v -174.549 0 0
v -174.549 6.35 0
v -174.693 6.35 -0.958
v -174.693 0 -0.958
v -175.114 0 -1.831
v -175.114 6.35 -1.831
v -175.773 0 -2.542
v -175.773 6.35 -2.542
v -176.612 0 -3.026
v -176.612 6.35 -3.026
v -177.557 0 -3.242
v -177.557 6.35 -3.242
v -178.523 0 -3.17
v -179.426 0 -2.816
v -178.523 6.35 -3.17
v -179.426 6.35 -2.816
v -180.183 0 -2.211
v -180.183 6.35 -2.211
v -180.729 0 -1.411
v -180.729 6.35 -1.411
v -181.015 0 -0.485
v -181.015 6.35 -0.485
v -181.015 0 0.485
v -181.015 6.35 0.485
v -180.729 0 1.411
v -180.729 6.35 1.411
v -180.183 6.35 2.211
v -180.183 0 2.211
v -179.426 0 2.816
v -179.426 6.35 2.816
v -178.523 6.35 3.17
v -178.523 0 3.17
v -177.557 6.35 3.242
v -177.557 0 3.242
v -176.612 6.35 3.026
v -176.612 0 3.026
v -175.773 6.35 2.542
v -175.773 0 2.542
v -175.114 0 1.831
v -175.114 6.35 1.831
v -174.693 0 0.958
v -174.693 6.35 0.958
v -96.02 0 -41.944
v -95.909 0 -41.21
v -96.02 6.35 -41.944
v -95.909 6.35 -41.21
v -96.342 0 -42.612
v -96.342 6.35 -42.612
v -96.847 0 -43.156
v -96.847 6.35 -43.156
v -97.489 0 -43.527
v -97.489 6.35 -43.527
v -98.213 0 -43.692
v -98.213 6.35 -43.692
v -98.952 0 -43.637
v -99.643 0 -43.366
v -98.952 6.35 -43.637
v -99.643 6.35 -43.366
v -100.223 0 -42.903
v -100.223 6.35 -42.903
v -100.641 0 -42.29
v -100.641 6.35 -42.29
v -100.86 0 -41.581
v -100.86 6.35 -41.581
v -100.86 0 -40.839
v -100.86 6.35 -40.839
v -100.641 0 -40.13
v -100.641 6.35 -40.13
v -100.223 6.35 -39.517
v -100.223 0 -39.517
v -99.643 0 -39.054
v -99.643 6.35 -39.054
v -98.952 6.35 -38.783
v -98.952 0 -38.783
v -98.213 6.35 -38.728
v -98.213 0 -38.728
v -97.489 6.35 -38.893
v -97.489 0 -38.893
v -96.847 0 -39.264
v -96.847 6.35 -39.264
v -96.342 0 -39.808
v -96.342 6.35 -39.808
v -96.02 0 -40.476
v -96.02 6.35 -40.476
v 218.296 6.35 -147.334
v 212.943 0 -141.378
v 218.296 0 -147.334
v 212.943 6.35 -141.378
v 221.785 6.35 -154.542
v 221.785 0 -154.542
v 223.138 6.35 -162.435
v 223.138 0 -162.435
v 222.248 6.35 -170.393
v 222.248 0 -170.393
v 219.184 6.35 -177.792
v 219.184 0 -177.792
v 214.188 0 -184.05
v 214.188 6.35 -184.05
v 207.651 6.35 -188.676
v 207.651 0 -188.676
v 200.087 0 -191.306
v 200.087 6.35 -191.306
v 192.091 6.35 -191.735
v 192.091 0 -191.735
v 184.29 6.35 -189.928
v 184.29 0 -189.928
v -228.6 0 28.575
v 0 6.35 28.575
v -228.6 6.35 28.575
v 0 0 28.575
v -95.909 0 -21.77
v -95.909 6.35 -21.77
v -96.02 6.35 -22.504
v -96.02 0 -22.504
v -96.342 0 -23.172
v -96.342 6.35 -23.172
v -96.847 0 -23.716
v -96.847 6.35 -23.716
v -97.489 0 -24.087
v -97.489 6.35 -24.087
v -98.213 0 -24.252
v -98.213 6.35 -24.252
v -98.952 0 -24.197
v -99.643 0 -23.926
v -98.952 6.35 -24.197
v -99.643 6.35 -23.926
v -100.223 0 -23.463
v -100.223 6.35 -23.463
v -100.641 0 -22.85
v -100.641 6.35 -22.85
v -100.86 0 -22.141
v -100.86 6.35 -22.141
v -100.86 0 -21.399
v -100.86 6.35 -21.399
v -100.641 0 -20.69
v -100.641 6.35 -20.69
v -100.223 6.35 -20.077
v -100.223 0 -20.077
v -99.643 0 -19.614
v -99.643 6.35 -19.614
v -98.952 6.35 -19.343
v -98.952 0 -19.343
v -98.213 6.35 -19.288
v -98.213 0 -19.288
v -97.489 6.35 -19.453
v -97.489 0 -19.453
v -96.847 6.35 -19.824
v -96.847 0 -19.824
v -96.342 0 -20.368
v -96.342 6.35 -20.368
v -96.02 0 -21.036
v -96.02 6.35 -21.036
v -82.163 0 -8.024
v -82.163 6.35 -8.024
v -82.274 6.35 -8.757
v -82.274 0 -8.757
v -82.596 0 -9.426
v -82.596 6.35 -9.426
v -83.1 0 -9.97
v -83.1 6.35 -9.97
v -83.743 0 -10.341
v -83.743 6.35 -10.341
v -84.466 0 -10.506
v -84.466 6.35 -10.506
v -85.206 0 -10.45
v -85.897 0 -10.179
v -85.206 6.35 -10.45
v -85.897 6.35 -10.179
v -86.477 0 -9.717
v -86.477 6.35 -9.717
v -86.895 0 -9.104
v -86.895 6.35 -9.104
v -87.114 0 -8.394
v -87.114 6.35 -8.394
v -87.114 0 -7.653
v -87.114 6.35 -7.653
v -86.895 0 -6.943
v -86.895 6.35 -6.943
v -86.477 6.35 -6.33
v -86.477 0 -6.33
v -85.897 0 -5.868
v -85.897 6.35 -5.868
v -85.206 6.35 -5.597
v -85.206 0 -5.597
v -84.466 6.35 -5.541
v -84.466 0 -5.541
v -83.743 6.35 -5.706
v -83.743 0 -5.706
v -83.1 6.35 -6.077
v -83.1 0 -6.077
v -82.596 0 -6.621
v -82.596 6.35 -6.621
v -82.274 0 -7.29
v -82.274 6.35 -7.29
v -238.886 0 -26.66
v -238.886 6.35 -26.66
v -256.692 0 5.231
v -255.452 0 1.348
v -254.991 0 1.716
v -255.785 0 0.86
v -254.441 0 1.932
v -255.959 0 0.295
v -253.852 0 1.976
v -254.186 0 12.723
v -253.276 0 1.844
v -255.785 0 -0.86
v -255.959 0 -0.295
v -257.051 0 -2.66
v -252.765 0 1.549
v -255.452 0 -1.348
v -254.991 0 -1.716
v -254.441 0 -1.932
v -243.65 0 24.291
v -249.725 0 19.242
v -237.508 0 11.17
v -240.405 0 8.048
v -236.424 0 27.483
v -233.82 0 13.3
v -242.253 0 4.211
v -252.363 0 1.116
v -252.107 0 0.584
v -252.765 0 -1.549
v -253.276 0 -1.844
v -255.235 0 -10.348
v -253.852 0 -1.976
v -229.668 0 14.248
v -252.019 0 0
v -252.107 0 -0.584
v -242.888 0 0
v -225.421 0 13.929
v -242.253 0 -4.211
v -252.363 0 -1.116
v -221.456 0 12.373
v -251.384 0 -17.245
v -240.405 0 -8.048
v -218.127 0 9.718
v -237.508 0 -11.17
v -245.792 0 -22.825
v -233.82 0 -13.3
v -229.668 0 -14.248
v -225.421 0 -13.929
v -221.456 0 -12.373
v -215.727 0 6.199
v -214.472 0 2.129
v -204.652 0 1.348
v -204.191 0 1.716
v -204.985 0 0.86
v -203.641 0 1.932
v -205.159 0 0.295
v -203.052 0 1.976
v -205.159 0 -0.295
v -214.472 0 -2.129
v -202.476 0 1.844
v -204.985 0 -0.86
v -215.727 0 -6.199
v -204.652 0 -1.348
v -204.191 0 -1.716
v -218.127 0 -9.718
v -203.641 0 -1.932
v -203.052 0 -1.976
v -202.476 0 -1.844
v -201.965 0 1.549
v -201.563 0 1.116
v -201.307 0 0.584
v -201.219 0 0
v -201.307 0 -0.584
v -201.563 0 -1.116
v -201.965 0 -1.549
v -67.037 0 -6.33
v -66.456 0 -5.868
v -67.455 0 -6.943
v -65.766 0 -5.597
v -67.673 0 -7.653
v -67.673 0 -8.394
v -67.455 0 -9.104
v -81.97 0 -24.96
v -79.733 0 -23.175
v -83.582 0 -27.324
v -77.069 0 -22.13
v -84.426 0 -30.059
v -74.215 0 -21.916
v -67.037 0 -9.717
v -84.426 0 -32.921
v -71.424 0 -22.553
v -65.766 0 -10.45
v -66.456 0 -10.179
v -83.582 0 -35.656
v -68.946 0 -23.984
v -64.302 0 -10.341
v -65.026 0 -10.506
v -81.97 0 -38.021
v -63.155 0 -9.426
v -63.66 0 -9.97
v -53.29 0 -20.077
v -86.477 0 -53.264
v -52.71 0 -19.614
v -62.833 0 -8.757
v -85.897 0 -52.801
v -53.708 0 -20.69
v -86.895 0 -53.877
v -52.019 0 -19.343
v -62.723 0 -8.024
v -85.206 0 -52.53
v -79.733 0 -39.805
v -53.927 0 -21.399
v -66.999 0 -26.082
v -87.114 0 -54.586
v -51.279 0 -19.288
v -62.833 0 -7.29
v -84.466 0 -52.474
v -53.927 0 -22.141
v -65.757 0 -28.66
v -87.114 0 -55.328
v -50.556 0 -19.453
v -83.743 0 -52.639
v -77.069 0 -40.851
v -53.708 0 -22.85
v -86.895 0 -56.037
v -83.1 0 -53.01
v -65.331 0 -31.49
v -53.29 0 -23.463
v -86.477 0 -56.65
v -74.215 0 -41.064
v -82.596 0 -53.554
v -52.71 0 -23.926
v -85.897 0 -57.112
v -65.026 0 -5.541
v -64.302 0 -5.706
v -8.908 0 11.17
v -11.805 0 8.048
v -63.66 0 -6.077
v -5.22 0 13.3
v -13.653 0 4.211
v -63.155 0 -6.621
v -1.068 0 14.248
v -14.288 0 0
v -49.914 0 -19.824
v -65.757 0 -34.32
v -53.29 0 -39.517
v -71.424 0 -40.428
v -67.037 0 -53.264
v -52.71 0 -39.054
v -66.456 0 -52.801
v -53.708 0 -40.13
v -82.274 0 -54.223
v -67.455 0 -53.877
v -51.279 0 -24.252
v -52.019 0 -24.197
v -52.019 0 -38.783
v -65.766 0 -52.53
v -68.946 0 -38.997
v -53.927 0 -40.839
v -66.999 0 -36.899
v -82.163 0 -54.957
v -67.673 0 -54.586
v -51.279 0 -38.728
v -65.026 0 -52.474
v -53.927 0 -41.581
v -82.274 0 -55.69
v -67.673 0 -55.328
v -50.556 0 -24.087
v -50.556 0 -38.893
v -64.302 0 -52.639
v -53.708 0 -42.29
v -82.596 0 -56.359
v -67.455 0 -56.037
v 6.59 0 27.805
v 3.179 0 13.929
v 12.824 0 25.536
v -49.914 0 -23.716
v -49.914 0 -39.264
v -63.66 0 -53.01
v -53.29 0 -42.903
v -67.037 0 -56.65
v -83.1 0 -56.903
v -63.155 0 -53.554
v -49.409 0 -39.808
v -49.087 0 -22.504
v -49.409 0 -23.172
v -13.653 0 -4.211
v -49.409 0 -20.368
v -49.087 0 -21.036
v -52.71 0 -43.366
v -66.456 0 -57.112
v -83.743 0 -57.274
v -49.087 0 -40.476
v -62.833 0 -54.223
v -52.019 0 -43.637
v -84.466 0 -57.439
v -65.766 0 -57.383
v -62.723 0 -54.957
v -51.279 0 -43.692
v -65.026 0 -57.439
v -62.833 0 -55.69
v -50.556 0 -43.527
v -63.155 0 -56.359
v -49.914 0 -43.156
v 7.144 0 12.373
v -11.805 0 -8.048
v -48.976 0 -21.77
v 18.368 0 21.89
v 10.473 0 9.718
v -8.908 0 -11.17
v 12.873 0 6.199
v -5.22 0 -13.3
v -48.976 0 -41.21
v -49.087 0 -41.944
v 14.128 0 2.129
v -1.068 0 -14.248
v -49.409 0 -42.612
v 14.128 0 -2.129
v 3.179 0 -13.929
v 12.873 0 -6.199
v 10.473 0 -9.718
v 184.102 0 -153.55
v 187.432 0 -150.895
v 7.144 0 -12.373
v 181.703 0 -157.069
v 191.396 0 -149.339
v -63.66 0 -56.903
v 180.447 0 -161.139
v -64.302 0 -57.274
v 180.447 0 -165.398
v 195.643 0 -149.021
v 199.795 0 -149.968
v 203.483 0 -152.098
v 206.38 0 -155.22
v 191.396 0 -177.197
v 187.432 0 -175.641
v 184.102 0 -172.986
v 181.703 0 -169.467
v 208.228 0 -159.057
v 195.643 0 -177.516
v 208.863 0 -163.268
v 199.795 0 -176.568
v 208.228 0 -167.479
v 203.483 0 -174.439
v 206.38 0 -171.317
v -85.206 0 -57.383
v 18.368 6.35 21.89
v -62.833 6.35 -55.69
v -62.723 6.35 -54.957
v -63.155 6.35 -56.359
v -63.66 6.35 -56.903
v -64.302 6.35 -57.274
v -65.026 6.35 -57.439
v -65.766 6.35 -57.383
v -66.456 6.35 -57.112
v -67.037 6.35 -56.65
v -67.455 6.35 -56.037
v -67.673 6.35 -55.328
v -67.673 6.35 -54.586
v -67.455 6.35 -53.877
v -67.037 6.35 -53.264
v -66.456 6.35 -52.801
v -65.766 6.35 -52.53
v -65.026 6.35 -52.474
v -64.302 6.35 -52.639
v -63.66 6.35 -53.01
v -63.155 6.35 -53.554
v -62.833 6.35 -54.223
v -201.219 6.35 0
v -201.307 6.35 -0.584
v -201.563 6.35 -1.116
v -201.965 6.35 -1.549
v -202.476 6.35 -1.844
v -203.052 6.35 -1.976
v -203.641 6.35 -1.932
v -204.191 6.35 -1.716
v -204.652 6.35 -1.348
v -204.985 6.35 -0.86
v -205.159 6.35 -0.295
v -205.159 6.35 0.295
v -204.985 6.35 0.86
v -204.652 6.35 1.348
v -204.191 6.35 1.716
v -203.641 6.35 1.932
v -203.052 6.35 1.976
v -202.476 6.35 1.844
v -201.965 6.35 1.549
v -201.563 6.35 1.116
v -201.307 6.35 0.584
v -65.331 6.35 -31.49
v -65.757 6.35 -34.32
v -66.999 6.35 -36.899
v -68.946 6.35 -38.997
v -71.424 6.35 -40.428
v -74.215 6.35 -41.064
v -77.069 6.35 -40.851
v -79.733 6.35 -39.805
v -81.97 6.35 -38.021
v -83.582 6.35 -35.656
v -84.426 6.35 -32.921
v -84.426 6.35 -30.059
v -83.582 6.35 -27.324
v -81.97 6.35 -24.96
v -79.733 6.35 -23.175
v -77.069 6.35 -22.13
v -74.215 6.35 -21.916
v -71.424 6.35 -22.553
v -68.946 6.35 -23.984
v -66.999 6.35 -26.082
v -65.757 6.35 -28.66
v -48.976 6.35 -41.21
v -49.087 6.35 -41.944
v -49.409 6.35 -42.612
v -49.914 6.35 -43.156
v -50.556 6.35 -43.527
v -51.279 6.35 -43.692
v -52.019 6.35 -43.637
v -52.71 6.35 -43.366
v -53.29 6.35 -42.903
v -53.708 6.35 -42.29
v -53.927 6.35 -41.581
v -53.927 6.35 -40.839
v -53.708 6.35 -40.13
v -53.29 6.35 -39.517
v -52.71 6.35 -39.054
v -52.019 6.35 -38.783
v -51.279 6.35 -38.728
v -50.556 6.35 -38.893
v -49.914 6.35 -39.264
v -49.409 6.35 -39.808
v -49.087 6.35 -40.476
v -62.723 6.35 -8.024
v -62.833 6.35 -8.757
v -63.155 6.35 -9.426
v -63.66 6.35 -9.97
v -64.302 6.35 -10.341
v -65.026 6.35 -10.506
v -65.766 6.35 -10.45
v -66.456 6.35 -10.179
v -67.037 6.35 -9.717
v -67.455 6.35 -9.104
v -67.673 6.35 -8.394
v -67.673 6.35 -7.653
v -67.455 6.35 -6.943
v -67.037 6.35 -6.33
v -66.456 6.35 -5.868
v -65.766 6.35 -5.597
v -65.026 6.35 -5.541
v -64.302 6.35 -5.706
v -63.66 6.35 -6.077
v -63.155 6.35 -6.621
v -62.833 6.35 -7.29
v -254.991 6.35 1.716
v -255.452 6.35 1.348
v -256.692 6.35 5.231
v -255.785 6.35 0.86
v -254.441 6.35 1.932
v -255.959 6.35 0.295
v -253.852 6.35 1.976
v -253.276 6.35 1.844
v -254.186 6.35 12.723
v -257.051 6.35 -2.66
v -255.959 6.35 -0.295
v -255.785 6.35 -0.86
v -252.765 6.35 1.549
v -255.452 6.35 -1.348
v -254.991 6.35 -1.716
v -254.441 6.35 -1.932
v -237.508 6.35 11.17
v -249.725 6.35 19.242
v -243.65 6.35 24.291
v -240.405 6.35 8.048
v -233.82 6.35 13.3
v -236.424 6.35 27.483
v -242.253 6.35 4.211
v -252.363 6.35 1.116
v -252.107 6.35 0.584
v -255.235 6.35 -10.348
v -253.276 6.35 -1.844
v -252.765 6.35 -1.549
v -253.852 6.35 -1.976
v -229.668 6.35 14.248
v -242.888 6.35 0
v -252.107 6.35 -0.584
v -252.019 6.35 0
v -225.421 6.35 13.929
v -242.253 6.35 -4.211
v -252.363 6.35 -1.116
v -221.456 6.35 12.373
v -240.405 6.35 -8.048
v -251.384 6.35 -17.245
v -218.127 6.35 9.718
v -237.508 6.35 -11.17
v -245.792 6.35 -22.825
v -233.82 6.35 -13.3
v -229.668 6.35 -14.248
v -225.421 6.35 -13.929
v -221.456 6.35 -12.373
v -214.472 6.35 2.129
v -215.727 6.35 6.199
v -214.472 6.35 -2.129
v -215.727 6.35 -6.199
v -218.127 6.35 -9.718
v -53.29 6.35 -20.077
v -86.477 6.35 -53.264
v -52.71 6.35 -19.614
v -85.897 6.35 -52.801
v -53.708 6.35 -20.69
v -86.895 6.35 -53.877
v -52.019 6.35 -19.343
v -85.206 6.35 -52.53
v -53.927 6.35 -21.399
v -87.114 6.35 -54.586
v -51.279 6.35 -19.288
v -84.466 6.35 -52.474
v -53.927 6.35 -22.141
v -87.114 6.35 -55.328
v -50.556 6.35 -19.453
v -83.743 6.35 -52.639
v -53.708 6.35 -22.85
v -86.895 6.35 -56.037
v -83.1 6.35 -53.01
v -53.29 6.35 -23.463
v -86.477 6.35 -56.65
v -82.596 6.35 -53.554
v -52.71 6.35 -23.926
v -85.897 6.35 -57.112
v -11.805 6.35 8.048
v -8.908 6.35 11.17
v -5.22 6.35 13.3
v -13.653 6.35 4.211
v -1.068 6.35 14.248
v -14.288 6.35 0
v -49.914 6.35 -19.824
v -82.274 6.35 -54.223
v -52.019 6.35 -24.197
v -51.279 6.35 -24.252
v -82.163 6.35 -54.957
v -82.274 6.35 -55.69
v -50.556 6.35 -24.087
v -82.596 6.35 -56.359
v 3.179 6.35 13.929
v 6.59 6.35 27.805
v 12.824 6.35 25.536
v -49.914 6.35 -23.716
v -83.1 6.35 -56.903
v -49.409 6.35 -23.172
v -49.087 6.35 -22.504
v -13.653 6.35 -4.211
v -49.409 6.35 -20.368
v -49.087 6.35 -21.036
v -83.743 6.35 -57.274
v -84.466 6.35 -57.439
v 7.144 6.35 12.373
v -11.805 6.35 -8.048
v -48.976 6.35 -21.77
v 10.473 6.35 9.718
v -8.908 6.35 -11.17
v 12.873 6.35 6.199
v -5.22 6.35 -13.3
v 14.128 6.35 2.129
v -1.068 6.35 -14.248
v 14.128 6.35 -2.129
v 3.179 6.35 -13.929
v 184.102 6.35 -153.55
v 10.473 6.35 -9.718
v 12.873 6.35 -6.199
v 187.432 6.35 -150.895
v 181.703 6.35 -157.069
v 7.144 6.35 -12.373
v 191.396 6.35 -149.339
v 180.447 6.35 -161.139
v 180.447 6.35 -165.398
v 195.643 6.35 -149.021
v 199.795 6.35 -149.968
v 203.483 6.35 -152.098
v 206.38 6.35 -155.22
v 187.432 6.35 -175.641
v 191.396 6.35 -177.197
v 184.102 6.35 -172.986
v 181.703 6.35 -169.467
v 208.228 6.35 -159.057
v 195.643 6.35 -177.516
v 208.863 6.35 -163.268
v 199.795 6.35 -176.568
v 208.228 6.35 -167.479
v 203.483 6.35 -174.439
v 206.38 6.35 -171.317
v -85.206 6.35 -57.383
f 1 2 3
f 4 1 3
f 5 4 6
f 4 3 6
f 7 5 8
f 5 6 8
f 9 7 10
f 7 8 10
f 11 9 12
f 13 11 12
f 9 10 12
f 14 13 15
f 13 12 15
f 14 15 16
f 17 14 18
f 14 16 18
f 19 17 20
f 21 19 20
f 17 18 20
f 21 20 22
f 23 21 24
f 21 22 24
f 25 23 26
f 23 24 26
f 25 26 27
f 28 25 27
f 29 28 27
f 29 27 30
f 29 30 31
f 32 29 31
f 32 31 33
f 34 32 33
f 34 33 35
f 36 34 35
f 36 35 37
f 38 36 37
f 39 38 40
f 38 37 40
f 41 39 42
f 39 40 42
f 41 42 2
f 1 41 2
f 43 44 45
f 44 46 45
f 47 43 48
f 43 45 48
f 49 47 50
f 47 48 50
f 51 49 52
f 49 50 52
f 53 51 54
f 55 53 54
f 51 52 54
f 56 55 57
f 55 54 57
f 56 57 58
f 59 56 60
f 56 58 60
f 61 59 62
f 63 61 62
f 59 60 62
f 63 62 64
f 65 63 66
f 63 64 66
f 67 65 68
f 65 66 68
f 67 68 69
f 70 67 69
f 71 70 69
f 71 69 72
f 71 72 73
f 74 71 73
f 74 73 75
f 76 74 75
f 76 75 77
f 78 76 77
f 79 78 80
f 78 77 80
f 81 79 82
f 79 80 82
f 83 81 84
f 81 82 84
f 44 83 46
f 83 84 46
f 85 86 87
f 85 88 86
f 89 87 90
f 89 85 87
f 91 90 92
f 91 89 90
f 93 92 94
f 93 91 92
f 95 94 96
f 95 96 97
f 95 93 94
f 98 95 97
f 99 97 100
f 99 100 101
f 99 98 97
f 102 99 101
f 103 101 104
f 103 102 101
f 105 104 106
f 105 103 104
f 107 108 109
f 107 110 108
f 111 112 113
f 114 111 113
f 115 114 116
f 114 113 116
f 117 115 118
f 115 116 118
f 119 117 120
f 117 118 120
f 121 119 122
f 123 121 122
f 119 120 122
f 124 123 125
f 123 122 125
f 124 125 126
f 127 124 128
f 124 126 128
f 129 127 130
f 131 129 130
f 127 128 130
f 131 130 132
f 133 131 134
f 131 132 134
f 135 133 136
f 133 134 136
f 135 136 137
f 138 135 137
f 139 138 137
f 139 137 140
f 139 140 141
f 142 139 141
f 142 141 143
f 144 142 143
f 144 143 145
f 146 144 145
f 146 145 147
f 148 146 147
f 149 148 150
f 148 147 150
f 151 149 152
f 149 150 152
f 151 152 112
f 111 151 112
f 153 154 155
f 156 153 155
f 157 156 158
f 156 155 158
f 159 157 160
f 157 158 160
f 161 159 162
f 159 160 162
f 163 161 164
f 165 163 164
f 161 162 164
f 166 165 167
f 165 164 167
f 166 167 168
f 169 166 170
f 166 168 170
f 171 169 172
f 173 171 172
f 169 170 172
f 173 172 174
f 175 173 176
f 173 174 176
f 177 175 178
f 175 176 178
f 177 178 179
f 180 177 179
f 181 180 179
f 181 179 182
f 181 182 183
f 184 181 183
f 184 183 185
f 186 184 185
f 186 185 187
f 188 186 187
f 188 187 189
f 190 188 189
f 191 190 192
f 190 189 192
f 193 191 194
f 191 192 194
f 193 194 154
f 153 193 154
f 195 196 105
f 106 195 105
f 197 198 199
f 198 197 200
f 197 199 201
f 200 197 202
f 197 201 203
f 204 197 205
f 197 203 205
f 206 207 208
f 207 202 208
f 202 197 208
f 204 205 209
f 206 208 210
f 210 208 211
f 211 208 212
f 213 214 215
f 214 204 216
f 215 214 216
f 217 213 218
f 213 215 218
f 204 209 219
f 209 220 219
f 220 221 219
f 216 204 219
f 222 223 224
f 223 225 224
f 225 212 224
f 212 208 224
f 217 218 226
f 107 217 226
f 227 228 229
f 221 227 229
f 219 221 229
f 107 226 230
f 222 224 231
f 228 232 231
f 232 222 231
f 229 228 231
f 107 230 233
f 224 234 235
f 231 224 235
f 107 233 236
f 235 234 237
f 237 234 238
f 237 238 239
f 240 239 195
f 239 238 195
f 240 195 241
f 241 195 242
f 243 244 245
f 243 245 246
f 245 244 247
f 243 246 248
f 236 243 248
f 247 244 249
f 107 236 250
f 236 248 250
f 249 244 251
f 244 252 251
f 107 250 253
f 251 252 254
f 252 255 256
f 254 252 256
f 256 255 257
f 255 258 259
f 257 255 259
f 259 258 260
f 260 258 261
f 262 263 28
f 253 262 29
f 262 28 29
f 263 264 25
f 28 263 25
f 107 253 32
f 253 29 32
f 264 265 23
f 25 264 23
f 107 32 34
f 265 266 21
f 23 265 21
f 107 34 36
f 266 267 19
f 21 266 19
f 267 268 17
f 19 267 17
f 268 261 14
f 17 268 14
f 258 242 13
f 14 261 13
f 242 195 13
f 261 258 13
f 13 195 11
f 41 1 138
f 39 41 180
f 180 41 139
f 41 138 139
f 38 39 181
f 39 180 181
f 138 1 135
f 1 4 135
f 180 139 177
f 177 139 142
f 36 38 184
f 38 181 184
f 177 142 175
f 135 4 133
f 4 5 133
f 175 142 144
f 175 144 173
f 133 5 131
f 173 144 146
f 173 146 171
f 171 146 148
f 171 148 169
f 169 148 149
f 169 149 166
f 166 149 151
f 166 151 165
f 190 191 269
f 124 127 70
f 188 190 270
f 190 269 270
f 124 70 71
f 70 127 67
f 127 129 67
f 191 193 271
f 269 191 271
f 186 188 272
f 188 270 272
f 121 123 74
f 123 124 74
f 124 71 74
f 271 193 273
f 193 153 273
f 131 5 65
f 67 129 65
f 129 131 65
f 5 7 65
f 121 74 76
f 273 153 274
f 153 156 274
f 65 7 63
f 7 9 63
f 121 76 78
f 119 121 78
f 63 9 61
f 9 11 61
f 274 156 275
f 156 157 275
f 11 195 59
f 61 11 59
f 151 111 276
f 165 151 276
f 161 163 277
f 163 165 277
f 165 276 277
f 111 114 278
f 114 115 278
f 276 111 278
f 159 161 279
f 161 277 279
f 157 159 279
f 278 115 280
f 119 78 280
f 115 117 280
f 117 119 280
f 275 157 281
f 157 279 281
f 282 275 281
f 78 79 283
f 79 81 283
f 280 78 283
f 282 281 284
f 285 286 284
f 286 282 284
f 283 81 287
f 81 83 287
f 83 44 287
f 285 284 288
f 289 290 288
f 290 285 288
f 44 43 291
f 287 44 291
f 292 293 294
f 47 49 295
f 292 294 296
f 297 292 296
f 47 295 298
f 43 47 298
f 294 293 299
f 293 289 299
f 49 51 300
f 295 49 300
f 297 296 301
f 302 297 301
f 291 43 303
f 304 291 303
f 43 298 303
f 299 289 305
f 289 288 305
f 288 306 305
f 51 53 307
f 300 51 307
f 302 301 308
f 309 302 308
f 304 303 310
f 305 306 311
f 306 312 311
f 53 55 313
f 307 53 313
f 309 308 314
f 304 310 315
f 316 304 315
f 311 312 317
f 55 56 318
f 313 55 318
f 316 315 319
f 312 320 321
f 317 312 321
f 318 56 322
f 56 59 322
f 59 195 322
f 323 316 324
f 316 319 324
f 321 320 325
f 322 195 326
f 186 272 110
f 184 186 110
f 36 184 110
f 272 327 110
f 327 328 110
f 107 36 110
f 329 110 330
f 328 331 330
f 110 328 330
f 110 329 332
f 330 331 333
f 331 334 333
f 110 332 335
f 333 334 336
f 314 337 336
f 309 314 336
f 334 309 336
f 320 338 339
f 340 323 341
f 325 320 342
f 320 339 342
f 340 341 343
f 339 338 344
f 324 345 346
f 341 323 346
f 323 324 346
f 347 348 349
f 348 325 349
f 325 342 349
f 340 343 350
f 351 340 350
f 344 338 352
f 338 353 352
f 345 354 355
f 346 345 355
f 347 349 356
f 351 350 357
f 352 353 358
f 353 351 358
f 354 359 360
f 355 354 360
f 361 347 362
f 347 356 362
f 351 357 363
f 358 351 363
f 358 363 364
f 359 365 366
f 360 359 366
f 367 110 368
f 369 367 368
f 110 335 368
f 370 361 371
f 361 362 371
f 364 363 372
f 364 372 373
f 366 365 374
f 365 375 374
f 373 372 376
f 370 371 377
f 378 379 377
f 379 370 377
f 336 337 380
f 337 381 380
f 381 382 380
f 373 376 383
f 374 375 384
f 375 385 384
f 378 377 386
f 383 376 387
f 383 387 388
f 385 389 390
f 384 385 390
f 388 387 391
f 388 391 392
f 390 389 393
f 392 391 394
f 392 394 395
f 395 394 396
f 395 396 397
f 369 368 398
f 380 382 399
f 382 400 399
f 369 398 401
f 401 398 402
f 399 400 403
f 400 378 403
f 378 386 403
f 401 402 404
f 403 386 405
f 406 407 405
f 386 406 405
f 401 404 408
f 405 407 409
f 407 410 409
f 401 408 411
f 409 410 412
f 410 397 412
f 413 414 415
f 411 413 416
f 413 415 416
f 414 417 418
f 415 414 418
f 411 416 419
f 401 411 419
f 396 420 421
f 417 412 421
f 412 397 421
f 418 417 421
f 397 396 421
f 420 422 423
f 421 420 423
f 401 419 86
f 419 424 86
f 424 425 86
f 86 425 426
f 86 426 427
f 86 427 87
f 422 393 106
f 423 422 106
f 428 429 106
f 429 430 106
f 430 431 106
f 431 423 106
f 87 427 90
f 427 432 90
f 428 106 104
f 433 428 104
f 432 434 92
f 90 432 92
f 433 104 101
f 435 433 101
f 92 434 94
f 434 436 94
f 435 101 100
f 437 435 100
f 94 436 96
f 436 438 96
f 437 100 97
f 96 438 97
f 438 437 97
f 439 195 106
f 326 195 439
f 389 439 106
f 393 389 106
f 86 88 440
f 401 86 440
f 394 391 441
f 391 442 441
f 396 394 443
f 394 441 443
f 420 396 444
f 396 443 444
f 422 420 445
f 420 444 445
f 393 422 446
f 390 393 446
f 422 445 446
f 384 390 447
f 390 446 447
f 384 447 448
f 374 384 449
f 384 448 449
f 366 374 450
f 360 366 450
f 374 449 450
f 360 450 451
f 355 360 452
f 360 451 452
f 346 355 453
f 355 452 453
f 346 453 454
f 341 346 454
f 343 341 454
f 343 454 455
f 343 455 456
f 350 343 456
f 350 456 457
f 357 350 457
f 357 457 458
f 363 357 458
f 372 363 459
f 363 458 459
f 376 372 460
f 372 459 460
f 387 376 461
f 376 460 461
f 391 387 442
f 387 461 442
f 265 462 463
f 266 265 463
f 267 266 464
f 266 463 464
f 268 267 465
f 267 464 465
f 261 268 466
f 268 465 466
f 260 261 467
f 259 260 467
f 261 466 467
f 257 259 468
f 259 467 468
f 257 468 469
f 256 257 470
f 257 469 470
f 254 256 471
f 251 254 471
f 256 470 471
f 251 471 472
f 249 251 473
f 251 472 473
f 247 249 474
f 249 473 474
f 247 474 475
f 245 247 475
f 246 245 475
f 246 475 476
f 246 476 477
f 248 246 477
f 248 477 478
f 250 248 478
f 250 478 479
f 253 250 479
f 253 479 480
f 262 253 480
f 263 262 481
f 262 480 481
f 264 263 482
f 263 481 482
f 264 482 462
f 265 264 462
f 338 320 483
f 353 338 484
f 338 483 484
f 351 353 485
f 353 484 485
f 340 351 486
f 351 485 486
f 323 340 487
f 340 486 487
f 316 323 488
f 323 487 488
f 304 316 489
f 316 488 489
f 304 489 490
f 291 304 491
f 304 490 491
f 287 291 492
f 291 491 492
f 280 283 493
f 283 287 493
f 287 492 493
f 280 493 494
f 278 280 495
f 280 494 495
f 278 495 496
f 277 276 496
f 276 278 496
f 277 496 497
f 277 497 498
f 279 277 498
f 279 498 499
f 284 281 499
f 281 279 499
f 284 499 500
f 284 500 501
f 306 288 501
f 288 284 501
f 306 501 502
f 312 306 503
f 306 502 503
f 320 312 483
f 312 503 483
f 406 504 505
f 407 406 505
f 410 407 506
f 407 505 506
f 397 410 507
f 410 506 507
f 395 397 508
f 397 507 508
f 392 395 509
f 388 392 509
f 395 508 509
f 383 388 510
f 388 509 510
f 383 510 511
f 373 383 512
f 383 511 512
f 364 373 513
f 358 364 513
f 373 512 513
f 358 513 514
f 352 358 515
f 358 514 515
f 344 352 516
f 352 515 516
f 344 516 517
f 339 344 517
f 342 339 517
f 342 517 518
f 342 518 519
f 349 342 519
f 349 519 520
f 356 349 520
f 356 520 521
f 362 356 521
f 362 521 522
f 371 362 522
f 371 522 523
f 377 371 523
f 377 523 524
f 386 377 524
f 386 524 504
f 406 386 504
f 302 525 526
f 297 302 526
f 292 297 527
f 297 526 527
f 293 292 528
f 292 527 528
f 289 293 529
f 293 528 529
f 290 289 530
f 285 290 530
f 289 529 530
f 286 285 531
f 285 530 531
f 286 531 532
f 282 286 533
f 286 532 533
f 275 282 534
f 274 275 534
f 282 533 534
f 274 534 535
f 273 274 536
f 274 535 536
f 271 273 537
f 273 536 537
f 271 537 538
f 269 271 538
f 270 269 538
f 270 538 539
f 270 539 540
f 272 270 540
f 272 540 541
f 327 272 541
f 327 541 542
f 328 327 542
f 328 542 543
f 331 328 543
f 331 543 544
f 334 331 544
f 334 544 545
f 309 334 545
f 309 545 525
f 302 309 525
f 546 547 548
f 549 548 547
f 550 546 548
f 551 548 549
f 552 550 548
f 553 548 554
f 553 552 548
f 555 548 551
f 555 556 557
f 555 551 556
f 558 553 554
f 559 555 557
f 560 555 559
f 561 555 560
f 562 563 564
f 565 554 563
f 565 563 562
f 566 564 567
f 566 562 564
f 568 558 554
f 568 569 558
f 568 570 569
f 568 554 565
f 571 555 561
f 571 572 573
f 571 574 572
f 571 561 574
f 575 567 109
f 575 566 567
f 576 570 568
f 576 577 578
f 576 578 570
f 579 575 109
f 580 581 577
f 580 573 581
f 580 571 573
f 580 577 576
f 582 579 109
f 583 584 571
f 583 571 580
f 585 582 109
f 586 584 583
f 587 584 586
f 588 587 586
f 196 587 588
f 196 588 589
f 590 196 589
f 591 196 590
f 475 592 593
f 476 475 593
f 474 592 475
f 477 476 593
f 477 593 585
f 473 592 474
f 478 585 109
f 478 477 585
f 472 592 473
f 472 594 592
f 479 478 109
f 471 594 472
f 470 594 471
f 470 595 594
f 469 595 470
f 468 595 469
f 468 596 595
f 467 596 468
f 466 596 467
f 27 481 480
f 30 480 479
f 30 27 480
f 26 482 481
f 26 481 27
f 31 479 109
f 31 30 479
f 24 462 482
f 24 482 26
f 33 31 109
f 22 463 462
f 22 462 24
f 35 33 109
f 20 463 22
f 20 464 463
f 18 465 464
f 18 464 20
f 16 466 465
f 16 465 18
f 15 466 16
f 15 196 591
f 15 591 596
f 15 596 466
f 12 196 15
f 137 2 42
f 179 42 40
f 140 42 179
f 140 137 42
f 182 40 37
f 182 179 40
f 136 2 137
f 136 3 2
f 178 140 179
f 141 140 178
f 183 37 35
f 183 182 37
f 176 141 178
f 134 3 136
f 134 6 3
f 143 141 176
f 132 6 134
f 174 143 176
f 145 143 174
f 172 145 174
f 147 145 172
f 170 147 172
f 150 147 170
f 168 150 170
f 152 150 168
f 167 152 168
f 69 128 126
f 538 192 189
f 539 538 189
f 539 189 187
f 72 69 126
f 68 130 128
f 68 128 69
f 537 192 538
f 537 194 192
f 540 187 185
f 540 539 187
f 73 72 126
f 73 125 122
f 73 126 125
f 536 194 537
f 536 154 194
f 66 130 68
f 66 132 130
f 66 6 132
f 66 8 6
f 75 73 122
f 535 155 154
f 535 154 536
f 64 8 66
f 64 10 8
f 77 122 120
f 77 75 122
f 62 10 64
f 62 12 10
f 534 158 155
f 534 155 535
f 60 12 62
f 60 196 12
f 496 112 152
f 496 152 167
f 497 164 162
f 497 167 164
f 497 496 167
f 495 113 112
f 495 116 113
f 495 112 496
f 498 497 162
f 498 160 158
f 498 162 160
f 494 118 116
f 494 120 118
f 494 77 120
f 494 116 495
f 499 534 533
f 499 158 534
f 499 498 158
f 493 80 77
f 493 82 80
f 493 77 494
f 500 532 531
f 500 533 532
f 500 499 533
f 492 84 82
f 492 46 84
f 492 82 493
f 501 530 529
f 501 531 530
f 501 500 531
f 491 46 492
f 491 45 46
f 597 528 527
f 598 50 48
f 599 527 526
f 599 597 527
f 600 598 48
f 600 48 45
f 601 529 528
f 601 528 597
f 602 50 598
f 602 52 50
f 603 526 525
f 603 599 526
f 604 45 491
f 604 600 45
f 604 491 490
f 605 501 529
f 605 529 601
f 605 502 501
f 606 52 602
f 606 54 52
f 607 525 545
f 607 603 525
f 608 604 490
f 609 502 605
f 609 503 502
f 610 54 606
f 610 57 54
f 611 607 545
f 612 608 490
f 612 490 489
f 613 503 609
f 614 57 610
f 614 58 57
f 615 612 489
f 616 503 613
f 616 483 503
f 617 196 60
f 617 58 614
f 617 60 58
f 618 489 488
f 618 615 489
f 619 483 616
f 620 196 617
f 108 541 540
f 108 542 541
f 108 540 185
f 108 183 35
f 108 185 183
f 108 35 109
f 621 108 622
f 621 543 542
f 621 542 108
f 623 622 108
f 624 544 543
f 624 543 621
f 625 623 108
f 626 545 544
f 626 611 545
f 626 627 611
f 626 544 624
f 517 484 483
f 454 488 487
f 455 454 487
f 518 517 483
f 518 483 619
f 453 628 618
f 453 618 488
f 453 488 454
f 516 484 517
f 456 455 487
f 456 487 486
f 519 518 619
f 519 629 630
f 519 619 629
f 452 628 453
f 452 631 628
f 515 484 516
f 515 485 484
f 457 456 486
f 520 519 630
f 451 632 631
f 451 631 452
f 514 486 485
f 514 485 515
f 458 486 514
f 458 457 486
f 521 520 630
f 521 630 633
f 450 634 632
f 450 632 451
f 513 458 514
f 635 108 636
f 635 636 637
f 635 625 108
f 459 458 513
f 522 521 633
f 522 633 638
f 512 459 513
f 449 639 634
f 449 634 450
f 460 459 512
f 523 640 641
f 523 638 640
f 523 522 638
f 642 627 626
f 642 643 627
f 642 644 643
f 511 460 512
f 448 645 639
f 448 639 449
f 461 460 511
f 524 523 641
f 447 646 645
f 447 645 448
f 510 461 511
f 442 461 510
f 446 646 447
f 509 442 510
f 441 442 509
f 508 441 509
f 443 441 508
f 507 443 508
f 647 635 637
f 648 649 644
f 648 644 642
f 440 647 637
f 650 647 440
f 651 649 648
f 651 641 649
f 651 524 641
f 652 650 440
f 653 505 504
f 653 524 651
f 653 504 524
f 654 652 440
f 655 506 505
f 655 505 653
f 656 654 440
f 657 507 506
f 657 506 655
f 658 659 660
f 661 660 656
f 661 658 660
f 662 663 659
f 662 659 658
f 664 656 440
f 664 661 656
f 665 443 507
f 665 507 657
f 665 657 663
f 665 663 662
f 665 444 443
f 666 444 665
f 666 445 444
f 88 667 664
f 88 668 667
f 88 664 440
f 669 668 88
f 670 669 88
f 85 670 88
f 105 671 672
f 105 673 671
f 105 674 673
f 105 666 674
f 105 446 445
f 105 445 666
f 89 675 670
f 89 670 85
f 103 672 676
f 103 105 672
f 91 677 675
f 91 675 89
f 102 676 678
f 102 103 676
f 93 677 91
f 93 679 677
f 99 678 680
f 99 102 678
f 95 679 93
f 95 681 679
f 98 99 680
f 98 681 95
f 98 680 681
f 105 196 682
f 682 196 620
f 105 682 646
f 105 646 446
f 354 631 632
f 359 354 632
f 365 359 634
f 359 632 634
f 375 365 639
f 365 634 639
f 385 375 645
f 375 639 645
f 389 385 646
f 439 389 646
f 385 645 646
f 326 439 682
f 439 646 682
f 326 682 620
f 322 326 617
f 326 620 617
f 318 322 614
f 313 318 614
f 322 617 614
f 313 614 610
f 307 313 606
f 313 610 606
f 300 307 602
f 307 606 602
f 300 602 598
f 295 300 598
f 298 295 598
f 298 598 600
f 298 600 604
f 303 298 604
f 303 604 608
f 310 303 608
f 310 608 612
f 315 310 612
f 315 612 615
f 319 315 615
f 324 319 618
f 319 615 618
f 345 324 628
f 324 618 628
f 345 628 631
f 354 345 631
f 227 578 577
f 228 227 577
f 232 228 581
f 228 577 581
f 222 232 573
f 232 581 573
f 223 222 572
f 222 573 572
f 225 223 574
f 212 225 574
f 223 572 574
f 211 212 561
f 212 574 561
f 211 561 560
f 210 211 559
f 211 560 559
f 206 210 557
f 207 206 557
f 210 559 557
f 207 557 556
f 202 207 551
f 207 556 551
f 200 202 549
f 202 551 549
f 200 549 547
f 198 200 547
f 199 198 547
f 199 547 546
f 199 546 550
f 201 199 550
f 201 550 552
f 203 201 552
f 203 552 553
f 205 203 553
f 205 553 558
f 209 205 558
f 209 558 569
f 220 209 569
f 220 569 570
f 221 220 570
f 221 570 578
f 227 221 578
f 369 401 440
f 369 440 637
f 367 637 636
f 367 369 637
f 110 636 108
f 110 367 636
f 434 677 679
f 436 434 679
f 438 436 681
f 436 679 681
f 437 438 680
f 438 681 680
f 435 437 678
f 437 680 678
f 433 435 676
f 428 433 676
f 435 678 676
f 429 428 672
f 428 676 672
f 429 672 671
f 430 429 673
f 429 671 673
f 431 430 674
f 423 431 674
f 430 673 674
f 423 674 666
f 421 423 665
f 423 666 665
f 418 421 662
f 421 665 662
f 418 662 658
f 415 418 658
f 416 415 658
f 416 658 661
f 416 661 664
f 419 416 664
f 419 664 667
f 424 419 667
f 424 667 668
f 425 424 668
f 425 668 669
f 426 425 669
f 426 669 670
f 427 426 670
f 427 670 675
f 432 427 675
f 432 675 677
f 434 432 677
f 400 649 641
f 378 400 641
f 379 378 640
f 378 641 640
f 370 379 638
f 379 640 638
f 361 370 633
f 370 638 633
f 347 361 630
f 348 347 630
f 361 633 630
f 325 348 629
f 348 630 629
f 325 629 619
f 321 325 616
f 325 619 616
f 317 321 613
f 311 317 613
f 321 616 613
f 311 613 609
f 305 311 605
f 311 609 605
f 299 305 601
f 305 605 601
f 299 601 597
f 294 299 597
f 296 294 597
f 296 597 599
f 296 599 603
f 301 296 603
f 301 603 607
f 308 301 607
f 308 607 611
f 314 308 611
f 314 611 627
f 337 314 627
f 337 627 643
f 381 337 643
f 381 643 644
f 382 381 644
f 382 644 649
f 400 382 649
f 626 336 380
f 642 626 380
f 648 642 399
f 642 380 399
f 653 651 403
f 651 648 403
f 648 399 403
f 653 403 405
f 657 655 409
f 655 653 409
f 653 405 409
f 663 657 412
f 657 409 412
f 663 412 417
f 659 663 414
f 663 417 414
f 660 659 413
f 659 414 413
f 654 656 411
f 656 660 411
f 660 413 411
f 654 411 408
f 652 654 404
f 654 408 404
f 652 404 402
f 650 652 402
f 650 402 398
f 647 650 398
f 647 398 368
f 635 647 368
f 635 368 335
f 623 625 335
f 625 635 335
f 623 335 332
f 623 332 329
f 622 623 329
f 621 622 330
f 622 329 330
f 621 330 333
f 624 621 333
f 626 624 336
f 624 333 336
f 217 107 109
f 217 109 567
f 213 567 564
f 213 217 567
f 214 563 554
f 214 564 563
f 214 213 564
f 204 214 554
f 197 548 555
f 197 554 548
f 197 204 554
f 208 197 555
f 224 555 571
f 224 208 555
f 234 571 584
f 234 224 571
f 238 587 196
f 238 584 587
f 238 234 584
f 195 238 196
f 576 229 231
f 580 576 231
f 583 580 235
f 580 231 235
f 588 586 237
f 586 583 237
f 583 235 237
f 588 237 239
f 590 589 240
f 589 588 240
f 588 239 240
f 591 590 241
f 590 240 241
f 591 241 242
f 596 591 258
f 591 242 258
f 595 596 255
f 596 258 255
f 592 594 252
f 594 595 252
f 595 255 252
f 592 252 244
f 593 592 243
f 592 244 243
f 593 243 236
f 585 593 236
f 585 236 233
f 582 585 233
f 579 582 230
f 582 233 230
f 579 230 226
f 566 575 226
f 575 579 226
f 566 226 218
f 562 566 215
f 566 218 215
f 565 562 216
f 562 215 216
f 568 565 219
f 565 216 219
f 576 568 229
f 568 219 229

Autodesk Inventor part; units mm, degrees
ref_plane "YZ Plane" through (0, 0, 0) normal (1, 0, 0) x (0, 1, 0)
ref_plane "XZ Plane" through (0, 0, 0) normal (0, 1, 0) x (-1, 0, 0)
ref_plane "XY Plane" through (0, 0, 0) normal (0, 0, 1) x (1, 0, 0)
sketch "Sketch1" plane through (0, 0, 0) normal (0, 1, 0) x (-1, 0, 0)
  circle A0 centre (0, 0) radius 14.2875
  line L0 (0, 0) -> (228.6, 0) construction
  circle A1 centre (228.6, 0) radius 14.2875
  circle A2 centre (0, 0) radius 28.575 construction
  circle A3 centre (228.6, 0) radius 28.575 construction
  line L1 (228.6, -28.575) -> (0, -28.575)
  line L2 (0, 28.575) -> (228.6, 28.575)
  arc A4 (228.6, -28.575) -> (228.6, 28.575) centre (228.6, 0) ccw
  arc A5 (0, 28.575) -> (0, -28.575) centre (0, 0) ccw
  dimension "d0" = 28.575
  dimension "d1" = 228.6
  dimension "d5" = 57.15
extrude "Extrusion1" add sketch "Sketch1" along normal blind 6.35
sketch "Sketch3" plane through (0, 6.35, 0) normal (0, 1, 0) x (1, 0, 0)
  circle A0 centre (-228.6, 0) radius 14.2875 construction
  line L0 (0, 0) -> (-228.6, 0) construction
  circle A1 centre (0, 0) radius 14.2875 construction
  line L1 (0, 0) -> (194.5753, 163.2681) construction
  arc A2 (0, -28.575) -> (0, 28.575) centre (0, 0) ccw projected
  circle A3 centre (0, 0) radius 28.575
  circle A4 centre (194.5753, 163.2681) radius 28.575 construction
  circle A5 centre (194.5753, 163.2681) radius 14.2875
  circle A6 centre (0, 0) radius 14.2875 projected
  line L2 (176.2076, 185.1578) -> (-18.3677, 21.8897)
  line L3 (212.9429, 141.3783) -> (18.3677, -21.8897)
  arc A7 (212.9429, 141.3783) -> (176.2076, 185.1578) centre (194.5753, 163.2681) ccw
  point P0 (0, 28.575)
  point P1 (18.3677, -21.8897)
  dimension "d12" = 254
  dimension "d13" = 140
extrude "Extrusion3" add sketch "Sketch3" against normal blind 6.35 contours A2 A3 L2 A7 L3
sketch "Sketch4" plane through (0, 6.35, 0) normal (0, 1, 0) x (1, 0, 0)
  circle A0 centre (-74.9321, 31.4901) radius 30 construction
  circle A1 centre (-74.9321, 31.4901) radius 25.4 construction
  circle A2 centre (-74.9321, 31.4901) radius 9.6012
  circle A3 centre (0, 0) radius 40.64 construction
  circle A4 centre (-74.9321, 31.4901) radius 40.64 construction
  line L0 (-84.6522, 8.0235) -> (-84.6522, 54.9566) construction
  line L1 (-84.6522, 54.9566) -> (-65.2119, 54.9566) construction
  line L2 (-65.2119, 54.9566) -> (-65.2119, 8.0235) construction
  line L3 (-65.2119, 8.0235) -> (-84.6522, 8.0235) construction
  circle A5 centre (-84.6522, 8.0235) radius 2.4892
  circle A6 centre (-65.2119, 8.0235) radius 2.4892
  circle A7 centre (-51.4655, 21.7699) radius 2.4892
  circle A8 centre (-51.4655, 41.2102) radius 2.4892
  line L4 (2.5406, 40.5605) -> (-2.5406, -40.5605) construction
  circle A9 centre (194.5753, 163.2681) radius 14.2875 construction
  line L5 (-74.9321, 31.4901) -> (194.5753, 163.2681) construction
  circle A10 centre (194.5753, 163.2681) radius 14.2875 projected
  circle A11 centre (0, 0) radius 14.2875 projected
  circle A12 centre (-228.6, 0) radius 14.2875 projected
  line L6 (-10.4004, 28.575) -> (-228.6, 28.575) projected
  arc A13 (-228.6, 28.575) -> (-228.6, -28.575) centre (-228.6, 0) ccw projected
  line L7 (-228.6, -28.575) -> (0, -28.575) projected
  arc A14 (0, -28.575) -> (18.3677, -21.8897) centre (0, 0) ccw projected
  line L8 (18.3677, -21.8897) -> (212.9429, 141.3783) projected
  arc A15 (212.9429, 141.3783) -> (176.2076, 185.1578) centre (194.5753, 163.2681) ccw projected
  line L9 (176.2076, 185.1578) -> (-10.4004, 28.575) projected
  arc A16 (-228.6, 28.575) -> (-228.6, -28.575) centre (-228.6, 0) ccw projected
  circle A17 centre (0, 0) radius 50.8 construction
  arc A18 (-228.6, 28.575) -> (-228.6, -28.575) centre (-228.6, 0) ccw projected
  arc A19 (212.9429, 141.3783) -> (176.2076, 185.1578) centre (194.5753, 163.2681) ccw projected
  line L10 (-238.8857, 26.6596) -> (184.2896, 189.9277)
  circle A20 centre (-65.2119, 54.9566) radius 2.4892
  circle A21 centre (-84.6522, 54.9566) radius 2.4892
  circle A22 centre (-98.3986, 41.2102) radius 2.4892
  circle A23 centre (-98.3986, 21.7699) radius 2.4892
  point P0 (34.7284, 53.046)
  point P1 (38.9386, 55.4768)
  point P2 (-93.3302, 28.575)
  point P3 (-88.3521, 28.575)
  point P4 (-73.8899, 28.575)
  point P5 (-68.9118, 28.575)
  point P6 (-75.3508, 28.575)
  point P7 (-71.7292, 28.575)
  point P8 (-55.9105, 28.575)
  point P9 (-52.2889, 28.575)
  dimension "d16" = 60
  dimension "d17" = 50.8
  dimension "d18" = 19.2024
  dimension "d19" = 81.28
  dimension "d21" = 4.9784
  dimension "d24" = 360
  dimension "d26" = 299.9994
  dimension "d31" = 101.6
extrude "Extrusion7" cut sketch "Sketch4" against normal blind 6.35 contours A2 L6 | L6 A2 | A5 | A6 | A7 | A8 | A20 | A21 | A22 | A23
extrude "Extrusion8" add sketch "Sketch4" against normal blind 6.35 contours A2 L6 A13 L10 A15 L9
sketch "Sketch5" plane through (0, 6.35, 0) normal (0, 1, 0) x (1, 0, 0)
  line L0 (-238.8857, 26.6596) -> (184.2896, 189.9277) projected
  circle A0 centre (68.7646, 145.3562) radius 15.875
  point P0 (0, 0)
  dimension "d38" = 31.75
  dimension "d41" = 123.825
extrude "Extrusion9" [suppressed]
fillet "Fillet1" [suppressed]
sketch "Sketch6" plane through (0, 6.35, 0) normal (0, 1, 0) x (1, 0, 0)
  circle A0 centre (-228.6, 0) radius 14.2875 construction
  line L0 (-228.6, 0) -> (-177.8, 0) construction
  circle A1 centre (-177.8, 0) radius 3.2512
  point P0 (0, 0)
  dimension "d43" = 50.8
  dimension "d44" = 6.5024
extrude "Extrusion10" cut sketch "Sketch6" against normal blind 6.35
sketch "Sketch7" plane through (0, 6.35, 0) normal (0, 1, 0) x (1, 0, 0)
  circle A0 centre (-254, 0) radius 1.9812
  circle A1 centre (-203.2, 0) radius 1.9812
  line L0 (-203.2, 0) -> (-254, 0) construction
  circle A2 centre (-228.6, 0) radius 14.2875 construction
  point P0 (0, 0)
  dimension "d47" = 50.8
  dimension "d48" = 3.9624
extrude "Extrusion11" cut sketch "Sketch7" against normal blind 6.35
thread "Thread1" size "8-32 UNC" class "2B" standard "ANSI Unified Screw Threads" full length
thread "Thread2" size "8-32 UNC" class "2B" standard "ANSI Unified Screw Threads" full length
properties part number "CORL_006_SmallPlate" material "Polycarbonate, Clear"
